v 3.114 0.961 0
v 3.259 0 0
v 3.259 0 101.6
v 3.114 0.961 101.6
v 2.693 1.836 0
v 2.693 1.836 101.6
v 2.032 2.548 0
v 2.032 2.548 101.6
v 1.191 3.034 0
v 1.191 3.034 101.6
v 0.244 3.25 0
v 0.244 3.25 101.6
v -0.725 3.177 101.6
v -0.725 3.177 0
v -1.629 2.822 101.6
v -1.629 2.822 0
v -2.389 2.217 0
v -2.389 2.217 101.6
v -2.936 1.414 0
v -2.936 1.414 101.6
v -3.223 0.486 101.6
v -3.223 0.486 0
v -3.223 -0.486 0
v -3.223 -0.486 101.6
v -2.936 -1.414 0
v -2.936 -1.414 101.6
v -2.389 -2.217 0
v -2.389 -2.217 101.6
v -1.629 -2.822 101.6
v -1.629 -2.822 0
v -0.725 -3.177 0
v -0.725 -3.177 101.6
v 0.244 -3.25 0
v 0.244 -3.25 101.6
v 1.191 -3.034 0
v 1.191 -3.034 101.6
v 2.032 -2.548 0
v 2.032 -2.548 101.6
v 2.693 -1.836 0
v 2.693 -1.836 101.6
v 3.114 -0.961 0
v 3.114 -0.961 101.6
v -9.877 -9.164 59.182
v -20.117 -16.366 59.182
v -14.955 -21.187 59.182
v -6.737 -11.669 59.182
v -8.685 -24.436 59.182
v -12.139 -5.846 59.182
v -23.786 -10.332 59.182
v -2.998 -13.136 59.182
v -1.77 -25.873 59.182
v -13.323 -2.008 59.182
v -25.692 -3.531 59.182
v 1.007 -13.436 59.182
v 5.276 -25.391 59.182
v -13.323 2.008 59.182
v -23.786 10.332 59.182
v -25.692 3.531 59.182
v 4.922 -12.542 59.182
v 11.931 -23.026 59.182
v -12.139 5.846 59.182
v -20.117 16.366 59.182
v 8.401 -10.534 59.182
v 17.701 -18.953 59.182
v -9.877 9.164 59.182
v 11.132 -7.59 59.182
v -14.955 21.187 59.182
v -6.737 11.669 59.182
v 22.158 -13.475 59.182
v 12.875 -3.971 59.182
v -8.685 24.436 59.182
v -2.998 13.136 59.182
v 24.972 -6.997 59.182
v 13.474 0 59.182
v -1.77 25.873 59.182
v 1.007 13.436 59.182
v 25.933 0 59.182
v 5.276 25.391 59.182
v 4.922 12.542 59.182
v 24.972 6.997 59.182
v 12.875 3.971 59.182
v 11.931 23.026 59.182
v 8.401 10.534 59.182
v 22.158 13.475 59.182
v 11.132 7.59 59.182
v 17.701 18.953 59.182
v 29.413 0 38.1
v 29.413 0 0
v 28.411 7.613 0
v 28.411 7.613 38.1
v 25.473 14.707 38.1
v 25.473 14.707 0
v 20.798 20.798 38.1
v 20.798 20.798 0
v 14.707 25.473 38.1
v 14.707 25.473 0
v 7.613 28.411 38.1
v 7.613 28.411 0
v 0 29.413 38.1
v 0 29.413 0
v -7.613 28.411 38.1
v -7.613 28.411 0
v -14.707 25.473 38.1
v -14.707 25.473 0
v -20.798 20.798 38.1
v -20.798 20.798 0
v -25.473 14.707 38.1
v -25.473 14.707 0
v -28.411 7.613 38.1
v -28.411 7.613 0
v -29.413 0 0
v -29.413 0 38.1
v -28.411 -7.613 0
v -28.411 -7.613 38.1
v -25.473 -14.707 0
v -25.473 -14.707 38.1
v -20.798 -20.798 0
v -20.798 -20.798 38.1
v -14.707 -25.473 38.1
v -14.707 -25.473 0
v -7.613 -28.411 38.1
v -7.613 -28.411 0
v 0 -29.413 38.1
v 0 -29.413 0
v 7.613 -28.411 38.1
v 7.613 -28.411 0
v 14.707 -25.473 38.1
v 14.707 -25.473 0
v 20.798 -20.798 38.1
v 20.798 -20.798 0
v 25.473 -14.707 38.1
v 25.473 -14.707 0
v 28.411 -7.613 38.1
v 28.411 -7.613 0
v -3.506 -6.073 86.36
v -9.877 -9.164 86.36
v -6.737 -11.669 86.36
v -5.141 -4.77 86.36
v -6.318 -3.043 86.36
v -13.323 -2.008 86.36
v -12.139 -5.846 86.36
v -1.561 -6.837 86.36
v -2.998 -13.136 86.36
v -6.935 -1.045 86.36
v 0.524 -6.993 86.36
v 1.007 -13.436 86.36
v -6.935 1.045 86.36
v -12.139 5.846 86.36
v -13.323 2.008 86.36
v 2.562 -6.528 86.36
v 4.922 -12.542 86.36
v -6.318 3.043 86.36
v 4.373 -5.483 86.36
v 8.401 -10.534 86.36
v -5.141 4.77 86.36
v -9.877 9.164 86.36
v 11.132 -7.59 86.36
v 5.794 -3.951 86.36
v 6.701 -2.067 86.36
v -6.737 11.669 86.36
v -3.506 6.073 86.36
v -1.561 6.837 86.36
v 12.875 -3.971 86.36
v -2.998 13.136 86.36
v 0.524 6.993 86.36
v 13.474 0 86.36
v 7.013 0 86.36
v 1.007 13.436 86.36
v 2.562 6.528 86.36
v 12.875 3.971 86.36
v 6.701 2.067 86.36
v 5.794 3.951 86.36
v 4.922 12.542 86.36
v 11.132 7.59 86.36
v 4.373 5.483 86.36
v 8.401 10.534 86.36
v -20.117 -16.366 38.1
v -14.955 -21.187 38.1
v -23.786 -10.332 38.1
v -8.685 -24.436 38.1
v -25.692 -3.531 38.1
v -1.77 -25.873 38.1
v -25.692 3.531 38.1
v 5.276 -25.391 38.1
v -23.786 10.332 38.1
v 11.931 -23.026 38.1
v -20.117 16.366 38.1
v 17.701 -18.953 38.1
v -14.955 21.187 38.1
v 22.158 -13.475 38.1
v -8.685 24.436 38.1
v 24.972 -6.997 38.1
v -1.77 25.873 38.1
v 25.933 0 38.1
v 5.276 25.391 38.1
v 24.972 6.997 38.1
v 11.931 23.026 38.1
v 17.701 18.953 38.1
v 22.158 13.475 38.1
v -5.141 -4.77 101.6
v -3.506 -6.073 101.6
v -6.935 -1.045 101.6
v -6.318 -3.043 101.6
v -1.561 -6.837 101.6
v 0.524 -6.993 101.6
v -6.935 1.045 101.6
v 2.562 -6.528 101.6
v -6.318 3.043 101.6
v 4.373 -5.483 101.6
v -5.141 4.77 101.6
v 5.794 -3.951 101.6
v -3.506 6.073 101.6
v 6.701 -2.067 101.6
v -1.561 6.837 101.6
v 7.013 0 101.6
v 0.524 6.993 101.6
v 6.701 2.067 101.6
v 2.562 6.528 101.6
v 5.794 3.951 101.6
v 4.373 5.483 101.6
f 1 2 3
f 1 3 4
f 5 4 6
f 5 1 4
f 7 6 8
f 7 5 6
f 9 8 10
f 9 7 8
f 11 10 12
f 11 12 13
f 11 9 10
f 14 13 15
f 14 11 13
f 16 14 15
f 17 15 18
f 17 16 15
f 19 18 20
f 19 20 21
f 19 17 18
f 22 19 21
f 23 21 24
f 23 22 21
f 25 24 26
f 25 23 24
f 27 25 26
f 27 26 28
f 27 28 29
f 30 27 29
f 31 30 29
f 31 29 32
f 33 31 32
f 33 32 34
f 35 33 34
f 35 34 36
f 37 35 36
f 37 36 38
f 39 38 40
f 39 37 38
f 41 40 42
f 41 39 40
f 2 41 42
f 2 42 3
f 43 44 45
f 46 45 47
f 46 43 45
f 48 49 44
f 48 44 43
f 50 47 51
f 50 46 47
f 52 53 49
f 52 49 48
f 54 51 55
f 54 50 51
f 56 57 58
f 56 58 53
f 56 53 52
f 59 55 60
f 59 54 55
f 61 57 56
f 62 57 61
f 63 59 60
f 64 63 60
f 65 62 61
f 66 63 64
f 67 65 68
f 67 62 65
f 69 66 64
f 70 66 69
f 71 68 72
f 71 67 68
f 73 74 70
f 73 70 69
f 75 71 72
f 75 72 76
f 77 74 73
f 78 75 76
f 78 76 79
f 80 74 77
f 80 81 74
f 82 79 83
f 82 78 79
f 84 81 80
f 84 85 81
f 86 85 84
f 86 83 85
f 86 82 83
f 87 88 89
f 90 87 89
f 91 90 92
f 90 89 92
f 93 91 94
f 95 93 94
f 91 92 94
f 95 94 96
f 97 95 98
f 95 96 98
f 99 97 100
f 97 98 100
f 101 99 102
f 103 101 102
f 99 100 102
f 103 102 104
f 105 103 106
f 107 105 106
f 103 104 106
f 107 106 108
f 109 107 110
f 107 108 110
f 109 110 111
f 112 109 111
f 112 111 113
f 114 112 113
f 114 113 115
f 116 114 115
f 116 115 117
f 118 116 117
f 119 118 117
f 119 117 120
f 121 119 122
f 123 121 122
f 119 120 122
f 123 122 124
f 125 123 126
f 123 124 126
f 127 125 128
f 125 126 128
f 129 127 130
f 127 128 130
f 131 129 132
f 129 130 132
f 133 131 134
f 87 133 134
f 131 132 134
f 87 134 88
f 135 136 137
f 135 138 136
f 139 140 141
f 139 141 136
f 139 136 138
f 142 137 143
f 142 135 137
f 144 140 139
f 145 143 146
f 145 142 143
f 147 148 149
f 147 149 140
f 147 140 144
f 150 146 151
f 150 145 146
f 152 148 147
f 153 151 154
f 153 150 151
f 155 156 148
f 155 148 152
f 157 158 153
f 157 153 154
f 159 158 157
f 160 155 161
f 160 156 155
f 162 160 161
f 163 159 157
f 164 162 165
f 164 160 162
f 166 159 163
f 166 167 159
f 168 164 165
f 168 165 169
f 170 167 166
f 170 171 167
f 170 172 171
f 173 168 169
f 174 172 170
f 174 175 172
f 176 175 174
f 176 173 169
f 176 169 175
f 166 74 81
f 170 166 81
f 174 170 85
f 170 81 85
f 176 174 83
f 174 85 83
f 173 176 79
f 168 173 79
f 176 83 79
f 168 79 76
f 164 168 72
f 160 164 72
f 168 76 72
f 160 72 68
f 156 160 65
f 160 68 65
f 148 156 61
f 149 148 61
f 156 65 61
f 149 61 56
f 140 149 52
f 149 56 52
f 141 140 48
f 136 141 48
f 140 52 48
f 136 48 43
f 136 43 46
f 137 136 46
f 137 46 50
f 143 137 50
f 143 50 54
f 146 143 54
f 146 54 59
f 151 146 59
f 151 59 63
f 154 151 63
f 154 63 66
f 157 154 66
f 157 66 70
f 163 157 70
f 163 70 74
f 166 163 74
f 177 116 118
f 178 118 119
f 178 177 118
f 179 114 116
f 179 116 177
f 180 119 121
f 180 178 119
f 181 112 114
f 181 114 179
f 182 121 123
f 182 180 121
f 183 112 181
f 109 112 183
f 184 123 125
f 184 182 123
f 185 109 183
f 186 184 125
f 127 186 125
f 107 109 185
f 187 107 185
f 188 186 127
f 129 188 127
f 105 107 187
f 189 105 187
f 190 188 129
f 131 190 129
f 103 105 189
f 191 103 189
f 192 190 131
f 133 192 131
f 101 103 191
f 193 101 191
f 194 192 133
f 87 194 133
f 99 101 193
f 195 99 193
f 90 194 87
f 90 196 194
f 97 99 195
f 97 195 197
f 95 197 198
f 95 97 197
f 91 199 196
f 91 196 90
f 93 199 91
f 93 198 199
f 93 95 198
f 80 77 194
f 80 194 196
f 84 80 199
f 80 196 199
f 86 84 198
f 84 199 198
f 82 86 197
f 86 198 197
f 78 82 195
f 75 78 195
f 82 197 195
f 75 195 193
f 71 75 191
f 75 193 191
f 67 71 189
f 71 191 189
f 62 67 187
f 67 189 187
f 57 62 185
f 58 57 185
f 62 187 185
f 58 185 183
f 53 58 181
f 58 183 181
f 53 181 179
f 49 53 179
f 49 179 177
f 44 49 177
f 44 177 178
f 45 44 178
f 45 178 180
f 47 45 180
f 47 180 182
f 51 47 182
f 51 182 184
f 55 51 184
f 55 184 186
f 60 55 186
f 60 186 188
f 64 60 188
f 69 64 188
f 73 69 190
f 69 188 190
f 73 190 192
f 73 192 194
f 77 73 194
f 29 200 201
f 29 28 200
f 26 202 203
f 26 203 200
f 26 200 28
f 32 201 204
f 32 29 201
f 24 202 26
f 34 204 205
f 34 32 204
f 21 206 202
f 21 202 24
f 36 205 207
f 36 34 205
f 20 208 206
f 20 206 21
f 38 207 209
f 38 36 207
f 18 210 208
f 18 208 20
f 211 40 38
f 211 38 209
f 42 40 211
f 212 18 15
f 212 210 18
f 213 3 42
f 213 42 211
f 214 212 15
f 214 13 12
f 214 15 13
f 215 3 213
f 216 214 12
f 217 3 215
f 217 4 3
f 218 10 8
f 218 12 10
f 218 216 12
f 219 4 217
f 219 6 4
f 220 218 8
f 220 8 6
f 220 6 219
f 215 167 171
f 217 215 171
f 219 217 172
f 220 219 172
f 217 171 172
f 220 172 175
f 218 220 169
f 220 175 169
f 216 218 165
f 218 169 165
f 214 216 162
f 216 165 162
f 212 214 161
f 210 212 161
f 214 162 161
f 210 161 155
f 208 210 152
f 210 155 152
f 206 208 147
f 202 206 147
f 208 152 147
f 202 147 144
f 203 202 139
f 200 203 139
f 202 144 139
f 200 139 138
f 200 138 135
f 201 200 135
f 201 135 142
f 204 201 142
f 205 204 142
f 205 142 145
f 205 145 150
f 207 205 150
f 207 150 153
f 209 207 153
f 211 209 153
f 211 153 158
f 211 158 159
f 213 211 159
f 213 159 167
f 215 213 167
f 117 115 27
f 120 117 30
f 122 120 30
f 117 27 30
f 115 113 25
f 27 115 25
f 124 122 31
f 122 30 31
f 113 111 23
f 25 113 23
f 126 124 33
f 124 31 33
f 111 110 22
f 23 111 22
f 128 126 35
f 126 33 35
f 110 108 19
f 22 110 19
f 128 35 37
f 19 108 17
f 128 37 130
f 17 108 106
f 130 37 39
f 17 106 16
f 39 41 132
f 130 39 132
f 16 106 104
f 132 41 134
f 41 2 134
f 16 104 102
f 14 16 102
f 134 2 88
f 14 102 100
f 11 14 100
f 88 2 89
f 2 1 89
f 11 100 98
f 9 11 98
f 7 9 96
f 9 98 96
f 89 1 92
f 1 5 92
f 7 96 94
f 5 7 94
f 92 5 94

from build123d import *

# Parameters (mm, degrees)
F0_R     = 29.4132
F0_R_2   = 25.9334
F1_DEPTH = 38.1
F0_R_3   = 13.4736510141
F2_DEPTH = 59.182
F0_R_4   = 7.012968683
F3_DEPTH = 86.36
F4_DEPTH = 50.8
F0_R_5   = 3.2589999641
F5_DEPTH = 101.6


# Not quite as in the source:
# - the program builds the solid bodies; features that only make, move or delete a surface that nothing else refers to are left out


with BuildPart() as f1:
    # F0 (on Top) → F1 (new body)
    with BuildSketch(Plane.XY):
        Circle(F0_R)
        Circle(F0_R_2, mode=Mode.SUBTRACT)
    extrude(amount=F1_DEPTH)

    # F0 (on Top) → F2 (join)
    with BuildSketch(Plane.XY):
        Circle(F0_R_2)
        Circle(F0_R_3, mode=Mode.SUBTRACT)
    extrude(amount=F2_DEPTH)

    # F0 (on Top) → F3 (join)
    with BuildSketch(Plane.XY):
        Circle(F0_R_3)
        Circle(F0_R_4, mode=Mode.SUBTRACT)
    extrude(amount=F3_DEPTH)

    # F0 (on Top) → F4 (join)
    with BuildSketch(Plane.XY):
        Circle(F0_R_3)
        Circle(F0_R_4, mode=Mode.SUBTRACT)
    extrude(amount=F4_DEPTH)

    # F0 (on Top) → F5 (join)
    with BuildSketch(Plane.XY):
        Circle(F0_R_4)
        Circle(F0_R_5, mode=Mode.SUBTRACT)
    extrude(amount=F5_DEPTH)


solid = f1.part
